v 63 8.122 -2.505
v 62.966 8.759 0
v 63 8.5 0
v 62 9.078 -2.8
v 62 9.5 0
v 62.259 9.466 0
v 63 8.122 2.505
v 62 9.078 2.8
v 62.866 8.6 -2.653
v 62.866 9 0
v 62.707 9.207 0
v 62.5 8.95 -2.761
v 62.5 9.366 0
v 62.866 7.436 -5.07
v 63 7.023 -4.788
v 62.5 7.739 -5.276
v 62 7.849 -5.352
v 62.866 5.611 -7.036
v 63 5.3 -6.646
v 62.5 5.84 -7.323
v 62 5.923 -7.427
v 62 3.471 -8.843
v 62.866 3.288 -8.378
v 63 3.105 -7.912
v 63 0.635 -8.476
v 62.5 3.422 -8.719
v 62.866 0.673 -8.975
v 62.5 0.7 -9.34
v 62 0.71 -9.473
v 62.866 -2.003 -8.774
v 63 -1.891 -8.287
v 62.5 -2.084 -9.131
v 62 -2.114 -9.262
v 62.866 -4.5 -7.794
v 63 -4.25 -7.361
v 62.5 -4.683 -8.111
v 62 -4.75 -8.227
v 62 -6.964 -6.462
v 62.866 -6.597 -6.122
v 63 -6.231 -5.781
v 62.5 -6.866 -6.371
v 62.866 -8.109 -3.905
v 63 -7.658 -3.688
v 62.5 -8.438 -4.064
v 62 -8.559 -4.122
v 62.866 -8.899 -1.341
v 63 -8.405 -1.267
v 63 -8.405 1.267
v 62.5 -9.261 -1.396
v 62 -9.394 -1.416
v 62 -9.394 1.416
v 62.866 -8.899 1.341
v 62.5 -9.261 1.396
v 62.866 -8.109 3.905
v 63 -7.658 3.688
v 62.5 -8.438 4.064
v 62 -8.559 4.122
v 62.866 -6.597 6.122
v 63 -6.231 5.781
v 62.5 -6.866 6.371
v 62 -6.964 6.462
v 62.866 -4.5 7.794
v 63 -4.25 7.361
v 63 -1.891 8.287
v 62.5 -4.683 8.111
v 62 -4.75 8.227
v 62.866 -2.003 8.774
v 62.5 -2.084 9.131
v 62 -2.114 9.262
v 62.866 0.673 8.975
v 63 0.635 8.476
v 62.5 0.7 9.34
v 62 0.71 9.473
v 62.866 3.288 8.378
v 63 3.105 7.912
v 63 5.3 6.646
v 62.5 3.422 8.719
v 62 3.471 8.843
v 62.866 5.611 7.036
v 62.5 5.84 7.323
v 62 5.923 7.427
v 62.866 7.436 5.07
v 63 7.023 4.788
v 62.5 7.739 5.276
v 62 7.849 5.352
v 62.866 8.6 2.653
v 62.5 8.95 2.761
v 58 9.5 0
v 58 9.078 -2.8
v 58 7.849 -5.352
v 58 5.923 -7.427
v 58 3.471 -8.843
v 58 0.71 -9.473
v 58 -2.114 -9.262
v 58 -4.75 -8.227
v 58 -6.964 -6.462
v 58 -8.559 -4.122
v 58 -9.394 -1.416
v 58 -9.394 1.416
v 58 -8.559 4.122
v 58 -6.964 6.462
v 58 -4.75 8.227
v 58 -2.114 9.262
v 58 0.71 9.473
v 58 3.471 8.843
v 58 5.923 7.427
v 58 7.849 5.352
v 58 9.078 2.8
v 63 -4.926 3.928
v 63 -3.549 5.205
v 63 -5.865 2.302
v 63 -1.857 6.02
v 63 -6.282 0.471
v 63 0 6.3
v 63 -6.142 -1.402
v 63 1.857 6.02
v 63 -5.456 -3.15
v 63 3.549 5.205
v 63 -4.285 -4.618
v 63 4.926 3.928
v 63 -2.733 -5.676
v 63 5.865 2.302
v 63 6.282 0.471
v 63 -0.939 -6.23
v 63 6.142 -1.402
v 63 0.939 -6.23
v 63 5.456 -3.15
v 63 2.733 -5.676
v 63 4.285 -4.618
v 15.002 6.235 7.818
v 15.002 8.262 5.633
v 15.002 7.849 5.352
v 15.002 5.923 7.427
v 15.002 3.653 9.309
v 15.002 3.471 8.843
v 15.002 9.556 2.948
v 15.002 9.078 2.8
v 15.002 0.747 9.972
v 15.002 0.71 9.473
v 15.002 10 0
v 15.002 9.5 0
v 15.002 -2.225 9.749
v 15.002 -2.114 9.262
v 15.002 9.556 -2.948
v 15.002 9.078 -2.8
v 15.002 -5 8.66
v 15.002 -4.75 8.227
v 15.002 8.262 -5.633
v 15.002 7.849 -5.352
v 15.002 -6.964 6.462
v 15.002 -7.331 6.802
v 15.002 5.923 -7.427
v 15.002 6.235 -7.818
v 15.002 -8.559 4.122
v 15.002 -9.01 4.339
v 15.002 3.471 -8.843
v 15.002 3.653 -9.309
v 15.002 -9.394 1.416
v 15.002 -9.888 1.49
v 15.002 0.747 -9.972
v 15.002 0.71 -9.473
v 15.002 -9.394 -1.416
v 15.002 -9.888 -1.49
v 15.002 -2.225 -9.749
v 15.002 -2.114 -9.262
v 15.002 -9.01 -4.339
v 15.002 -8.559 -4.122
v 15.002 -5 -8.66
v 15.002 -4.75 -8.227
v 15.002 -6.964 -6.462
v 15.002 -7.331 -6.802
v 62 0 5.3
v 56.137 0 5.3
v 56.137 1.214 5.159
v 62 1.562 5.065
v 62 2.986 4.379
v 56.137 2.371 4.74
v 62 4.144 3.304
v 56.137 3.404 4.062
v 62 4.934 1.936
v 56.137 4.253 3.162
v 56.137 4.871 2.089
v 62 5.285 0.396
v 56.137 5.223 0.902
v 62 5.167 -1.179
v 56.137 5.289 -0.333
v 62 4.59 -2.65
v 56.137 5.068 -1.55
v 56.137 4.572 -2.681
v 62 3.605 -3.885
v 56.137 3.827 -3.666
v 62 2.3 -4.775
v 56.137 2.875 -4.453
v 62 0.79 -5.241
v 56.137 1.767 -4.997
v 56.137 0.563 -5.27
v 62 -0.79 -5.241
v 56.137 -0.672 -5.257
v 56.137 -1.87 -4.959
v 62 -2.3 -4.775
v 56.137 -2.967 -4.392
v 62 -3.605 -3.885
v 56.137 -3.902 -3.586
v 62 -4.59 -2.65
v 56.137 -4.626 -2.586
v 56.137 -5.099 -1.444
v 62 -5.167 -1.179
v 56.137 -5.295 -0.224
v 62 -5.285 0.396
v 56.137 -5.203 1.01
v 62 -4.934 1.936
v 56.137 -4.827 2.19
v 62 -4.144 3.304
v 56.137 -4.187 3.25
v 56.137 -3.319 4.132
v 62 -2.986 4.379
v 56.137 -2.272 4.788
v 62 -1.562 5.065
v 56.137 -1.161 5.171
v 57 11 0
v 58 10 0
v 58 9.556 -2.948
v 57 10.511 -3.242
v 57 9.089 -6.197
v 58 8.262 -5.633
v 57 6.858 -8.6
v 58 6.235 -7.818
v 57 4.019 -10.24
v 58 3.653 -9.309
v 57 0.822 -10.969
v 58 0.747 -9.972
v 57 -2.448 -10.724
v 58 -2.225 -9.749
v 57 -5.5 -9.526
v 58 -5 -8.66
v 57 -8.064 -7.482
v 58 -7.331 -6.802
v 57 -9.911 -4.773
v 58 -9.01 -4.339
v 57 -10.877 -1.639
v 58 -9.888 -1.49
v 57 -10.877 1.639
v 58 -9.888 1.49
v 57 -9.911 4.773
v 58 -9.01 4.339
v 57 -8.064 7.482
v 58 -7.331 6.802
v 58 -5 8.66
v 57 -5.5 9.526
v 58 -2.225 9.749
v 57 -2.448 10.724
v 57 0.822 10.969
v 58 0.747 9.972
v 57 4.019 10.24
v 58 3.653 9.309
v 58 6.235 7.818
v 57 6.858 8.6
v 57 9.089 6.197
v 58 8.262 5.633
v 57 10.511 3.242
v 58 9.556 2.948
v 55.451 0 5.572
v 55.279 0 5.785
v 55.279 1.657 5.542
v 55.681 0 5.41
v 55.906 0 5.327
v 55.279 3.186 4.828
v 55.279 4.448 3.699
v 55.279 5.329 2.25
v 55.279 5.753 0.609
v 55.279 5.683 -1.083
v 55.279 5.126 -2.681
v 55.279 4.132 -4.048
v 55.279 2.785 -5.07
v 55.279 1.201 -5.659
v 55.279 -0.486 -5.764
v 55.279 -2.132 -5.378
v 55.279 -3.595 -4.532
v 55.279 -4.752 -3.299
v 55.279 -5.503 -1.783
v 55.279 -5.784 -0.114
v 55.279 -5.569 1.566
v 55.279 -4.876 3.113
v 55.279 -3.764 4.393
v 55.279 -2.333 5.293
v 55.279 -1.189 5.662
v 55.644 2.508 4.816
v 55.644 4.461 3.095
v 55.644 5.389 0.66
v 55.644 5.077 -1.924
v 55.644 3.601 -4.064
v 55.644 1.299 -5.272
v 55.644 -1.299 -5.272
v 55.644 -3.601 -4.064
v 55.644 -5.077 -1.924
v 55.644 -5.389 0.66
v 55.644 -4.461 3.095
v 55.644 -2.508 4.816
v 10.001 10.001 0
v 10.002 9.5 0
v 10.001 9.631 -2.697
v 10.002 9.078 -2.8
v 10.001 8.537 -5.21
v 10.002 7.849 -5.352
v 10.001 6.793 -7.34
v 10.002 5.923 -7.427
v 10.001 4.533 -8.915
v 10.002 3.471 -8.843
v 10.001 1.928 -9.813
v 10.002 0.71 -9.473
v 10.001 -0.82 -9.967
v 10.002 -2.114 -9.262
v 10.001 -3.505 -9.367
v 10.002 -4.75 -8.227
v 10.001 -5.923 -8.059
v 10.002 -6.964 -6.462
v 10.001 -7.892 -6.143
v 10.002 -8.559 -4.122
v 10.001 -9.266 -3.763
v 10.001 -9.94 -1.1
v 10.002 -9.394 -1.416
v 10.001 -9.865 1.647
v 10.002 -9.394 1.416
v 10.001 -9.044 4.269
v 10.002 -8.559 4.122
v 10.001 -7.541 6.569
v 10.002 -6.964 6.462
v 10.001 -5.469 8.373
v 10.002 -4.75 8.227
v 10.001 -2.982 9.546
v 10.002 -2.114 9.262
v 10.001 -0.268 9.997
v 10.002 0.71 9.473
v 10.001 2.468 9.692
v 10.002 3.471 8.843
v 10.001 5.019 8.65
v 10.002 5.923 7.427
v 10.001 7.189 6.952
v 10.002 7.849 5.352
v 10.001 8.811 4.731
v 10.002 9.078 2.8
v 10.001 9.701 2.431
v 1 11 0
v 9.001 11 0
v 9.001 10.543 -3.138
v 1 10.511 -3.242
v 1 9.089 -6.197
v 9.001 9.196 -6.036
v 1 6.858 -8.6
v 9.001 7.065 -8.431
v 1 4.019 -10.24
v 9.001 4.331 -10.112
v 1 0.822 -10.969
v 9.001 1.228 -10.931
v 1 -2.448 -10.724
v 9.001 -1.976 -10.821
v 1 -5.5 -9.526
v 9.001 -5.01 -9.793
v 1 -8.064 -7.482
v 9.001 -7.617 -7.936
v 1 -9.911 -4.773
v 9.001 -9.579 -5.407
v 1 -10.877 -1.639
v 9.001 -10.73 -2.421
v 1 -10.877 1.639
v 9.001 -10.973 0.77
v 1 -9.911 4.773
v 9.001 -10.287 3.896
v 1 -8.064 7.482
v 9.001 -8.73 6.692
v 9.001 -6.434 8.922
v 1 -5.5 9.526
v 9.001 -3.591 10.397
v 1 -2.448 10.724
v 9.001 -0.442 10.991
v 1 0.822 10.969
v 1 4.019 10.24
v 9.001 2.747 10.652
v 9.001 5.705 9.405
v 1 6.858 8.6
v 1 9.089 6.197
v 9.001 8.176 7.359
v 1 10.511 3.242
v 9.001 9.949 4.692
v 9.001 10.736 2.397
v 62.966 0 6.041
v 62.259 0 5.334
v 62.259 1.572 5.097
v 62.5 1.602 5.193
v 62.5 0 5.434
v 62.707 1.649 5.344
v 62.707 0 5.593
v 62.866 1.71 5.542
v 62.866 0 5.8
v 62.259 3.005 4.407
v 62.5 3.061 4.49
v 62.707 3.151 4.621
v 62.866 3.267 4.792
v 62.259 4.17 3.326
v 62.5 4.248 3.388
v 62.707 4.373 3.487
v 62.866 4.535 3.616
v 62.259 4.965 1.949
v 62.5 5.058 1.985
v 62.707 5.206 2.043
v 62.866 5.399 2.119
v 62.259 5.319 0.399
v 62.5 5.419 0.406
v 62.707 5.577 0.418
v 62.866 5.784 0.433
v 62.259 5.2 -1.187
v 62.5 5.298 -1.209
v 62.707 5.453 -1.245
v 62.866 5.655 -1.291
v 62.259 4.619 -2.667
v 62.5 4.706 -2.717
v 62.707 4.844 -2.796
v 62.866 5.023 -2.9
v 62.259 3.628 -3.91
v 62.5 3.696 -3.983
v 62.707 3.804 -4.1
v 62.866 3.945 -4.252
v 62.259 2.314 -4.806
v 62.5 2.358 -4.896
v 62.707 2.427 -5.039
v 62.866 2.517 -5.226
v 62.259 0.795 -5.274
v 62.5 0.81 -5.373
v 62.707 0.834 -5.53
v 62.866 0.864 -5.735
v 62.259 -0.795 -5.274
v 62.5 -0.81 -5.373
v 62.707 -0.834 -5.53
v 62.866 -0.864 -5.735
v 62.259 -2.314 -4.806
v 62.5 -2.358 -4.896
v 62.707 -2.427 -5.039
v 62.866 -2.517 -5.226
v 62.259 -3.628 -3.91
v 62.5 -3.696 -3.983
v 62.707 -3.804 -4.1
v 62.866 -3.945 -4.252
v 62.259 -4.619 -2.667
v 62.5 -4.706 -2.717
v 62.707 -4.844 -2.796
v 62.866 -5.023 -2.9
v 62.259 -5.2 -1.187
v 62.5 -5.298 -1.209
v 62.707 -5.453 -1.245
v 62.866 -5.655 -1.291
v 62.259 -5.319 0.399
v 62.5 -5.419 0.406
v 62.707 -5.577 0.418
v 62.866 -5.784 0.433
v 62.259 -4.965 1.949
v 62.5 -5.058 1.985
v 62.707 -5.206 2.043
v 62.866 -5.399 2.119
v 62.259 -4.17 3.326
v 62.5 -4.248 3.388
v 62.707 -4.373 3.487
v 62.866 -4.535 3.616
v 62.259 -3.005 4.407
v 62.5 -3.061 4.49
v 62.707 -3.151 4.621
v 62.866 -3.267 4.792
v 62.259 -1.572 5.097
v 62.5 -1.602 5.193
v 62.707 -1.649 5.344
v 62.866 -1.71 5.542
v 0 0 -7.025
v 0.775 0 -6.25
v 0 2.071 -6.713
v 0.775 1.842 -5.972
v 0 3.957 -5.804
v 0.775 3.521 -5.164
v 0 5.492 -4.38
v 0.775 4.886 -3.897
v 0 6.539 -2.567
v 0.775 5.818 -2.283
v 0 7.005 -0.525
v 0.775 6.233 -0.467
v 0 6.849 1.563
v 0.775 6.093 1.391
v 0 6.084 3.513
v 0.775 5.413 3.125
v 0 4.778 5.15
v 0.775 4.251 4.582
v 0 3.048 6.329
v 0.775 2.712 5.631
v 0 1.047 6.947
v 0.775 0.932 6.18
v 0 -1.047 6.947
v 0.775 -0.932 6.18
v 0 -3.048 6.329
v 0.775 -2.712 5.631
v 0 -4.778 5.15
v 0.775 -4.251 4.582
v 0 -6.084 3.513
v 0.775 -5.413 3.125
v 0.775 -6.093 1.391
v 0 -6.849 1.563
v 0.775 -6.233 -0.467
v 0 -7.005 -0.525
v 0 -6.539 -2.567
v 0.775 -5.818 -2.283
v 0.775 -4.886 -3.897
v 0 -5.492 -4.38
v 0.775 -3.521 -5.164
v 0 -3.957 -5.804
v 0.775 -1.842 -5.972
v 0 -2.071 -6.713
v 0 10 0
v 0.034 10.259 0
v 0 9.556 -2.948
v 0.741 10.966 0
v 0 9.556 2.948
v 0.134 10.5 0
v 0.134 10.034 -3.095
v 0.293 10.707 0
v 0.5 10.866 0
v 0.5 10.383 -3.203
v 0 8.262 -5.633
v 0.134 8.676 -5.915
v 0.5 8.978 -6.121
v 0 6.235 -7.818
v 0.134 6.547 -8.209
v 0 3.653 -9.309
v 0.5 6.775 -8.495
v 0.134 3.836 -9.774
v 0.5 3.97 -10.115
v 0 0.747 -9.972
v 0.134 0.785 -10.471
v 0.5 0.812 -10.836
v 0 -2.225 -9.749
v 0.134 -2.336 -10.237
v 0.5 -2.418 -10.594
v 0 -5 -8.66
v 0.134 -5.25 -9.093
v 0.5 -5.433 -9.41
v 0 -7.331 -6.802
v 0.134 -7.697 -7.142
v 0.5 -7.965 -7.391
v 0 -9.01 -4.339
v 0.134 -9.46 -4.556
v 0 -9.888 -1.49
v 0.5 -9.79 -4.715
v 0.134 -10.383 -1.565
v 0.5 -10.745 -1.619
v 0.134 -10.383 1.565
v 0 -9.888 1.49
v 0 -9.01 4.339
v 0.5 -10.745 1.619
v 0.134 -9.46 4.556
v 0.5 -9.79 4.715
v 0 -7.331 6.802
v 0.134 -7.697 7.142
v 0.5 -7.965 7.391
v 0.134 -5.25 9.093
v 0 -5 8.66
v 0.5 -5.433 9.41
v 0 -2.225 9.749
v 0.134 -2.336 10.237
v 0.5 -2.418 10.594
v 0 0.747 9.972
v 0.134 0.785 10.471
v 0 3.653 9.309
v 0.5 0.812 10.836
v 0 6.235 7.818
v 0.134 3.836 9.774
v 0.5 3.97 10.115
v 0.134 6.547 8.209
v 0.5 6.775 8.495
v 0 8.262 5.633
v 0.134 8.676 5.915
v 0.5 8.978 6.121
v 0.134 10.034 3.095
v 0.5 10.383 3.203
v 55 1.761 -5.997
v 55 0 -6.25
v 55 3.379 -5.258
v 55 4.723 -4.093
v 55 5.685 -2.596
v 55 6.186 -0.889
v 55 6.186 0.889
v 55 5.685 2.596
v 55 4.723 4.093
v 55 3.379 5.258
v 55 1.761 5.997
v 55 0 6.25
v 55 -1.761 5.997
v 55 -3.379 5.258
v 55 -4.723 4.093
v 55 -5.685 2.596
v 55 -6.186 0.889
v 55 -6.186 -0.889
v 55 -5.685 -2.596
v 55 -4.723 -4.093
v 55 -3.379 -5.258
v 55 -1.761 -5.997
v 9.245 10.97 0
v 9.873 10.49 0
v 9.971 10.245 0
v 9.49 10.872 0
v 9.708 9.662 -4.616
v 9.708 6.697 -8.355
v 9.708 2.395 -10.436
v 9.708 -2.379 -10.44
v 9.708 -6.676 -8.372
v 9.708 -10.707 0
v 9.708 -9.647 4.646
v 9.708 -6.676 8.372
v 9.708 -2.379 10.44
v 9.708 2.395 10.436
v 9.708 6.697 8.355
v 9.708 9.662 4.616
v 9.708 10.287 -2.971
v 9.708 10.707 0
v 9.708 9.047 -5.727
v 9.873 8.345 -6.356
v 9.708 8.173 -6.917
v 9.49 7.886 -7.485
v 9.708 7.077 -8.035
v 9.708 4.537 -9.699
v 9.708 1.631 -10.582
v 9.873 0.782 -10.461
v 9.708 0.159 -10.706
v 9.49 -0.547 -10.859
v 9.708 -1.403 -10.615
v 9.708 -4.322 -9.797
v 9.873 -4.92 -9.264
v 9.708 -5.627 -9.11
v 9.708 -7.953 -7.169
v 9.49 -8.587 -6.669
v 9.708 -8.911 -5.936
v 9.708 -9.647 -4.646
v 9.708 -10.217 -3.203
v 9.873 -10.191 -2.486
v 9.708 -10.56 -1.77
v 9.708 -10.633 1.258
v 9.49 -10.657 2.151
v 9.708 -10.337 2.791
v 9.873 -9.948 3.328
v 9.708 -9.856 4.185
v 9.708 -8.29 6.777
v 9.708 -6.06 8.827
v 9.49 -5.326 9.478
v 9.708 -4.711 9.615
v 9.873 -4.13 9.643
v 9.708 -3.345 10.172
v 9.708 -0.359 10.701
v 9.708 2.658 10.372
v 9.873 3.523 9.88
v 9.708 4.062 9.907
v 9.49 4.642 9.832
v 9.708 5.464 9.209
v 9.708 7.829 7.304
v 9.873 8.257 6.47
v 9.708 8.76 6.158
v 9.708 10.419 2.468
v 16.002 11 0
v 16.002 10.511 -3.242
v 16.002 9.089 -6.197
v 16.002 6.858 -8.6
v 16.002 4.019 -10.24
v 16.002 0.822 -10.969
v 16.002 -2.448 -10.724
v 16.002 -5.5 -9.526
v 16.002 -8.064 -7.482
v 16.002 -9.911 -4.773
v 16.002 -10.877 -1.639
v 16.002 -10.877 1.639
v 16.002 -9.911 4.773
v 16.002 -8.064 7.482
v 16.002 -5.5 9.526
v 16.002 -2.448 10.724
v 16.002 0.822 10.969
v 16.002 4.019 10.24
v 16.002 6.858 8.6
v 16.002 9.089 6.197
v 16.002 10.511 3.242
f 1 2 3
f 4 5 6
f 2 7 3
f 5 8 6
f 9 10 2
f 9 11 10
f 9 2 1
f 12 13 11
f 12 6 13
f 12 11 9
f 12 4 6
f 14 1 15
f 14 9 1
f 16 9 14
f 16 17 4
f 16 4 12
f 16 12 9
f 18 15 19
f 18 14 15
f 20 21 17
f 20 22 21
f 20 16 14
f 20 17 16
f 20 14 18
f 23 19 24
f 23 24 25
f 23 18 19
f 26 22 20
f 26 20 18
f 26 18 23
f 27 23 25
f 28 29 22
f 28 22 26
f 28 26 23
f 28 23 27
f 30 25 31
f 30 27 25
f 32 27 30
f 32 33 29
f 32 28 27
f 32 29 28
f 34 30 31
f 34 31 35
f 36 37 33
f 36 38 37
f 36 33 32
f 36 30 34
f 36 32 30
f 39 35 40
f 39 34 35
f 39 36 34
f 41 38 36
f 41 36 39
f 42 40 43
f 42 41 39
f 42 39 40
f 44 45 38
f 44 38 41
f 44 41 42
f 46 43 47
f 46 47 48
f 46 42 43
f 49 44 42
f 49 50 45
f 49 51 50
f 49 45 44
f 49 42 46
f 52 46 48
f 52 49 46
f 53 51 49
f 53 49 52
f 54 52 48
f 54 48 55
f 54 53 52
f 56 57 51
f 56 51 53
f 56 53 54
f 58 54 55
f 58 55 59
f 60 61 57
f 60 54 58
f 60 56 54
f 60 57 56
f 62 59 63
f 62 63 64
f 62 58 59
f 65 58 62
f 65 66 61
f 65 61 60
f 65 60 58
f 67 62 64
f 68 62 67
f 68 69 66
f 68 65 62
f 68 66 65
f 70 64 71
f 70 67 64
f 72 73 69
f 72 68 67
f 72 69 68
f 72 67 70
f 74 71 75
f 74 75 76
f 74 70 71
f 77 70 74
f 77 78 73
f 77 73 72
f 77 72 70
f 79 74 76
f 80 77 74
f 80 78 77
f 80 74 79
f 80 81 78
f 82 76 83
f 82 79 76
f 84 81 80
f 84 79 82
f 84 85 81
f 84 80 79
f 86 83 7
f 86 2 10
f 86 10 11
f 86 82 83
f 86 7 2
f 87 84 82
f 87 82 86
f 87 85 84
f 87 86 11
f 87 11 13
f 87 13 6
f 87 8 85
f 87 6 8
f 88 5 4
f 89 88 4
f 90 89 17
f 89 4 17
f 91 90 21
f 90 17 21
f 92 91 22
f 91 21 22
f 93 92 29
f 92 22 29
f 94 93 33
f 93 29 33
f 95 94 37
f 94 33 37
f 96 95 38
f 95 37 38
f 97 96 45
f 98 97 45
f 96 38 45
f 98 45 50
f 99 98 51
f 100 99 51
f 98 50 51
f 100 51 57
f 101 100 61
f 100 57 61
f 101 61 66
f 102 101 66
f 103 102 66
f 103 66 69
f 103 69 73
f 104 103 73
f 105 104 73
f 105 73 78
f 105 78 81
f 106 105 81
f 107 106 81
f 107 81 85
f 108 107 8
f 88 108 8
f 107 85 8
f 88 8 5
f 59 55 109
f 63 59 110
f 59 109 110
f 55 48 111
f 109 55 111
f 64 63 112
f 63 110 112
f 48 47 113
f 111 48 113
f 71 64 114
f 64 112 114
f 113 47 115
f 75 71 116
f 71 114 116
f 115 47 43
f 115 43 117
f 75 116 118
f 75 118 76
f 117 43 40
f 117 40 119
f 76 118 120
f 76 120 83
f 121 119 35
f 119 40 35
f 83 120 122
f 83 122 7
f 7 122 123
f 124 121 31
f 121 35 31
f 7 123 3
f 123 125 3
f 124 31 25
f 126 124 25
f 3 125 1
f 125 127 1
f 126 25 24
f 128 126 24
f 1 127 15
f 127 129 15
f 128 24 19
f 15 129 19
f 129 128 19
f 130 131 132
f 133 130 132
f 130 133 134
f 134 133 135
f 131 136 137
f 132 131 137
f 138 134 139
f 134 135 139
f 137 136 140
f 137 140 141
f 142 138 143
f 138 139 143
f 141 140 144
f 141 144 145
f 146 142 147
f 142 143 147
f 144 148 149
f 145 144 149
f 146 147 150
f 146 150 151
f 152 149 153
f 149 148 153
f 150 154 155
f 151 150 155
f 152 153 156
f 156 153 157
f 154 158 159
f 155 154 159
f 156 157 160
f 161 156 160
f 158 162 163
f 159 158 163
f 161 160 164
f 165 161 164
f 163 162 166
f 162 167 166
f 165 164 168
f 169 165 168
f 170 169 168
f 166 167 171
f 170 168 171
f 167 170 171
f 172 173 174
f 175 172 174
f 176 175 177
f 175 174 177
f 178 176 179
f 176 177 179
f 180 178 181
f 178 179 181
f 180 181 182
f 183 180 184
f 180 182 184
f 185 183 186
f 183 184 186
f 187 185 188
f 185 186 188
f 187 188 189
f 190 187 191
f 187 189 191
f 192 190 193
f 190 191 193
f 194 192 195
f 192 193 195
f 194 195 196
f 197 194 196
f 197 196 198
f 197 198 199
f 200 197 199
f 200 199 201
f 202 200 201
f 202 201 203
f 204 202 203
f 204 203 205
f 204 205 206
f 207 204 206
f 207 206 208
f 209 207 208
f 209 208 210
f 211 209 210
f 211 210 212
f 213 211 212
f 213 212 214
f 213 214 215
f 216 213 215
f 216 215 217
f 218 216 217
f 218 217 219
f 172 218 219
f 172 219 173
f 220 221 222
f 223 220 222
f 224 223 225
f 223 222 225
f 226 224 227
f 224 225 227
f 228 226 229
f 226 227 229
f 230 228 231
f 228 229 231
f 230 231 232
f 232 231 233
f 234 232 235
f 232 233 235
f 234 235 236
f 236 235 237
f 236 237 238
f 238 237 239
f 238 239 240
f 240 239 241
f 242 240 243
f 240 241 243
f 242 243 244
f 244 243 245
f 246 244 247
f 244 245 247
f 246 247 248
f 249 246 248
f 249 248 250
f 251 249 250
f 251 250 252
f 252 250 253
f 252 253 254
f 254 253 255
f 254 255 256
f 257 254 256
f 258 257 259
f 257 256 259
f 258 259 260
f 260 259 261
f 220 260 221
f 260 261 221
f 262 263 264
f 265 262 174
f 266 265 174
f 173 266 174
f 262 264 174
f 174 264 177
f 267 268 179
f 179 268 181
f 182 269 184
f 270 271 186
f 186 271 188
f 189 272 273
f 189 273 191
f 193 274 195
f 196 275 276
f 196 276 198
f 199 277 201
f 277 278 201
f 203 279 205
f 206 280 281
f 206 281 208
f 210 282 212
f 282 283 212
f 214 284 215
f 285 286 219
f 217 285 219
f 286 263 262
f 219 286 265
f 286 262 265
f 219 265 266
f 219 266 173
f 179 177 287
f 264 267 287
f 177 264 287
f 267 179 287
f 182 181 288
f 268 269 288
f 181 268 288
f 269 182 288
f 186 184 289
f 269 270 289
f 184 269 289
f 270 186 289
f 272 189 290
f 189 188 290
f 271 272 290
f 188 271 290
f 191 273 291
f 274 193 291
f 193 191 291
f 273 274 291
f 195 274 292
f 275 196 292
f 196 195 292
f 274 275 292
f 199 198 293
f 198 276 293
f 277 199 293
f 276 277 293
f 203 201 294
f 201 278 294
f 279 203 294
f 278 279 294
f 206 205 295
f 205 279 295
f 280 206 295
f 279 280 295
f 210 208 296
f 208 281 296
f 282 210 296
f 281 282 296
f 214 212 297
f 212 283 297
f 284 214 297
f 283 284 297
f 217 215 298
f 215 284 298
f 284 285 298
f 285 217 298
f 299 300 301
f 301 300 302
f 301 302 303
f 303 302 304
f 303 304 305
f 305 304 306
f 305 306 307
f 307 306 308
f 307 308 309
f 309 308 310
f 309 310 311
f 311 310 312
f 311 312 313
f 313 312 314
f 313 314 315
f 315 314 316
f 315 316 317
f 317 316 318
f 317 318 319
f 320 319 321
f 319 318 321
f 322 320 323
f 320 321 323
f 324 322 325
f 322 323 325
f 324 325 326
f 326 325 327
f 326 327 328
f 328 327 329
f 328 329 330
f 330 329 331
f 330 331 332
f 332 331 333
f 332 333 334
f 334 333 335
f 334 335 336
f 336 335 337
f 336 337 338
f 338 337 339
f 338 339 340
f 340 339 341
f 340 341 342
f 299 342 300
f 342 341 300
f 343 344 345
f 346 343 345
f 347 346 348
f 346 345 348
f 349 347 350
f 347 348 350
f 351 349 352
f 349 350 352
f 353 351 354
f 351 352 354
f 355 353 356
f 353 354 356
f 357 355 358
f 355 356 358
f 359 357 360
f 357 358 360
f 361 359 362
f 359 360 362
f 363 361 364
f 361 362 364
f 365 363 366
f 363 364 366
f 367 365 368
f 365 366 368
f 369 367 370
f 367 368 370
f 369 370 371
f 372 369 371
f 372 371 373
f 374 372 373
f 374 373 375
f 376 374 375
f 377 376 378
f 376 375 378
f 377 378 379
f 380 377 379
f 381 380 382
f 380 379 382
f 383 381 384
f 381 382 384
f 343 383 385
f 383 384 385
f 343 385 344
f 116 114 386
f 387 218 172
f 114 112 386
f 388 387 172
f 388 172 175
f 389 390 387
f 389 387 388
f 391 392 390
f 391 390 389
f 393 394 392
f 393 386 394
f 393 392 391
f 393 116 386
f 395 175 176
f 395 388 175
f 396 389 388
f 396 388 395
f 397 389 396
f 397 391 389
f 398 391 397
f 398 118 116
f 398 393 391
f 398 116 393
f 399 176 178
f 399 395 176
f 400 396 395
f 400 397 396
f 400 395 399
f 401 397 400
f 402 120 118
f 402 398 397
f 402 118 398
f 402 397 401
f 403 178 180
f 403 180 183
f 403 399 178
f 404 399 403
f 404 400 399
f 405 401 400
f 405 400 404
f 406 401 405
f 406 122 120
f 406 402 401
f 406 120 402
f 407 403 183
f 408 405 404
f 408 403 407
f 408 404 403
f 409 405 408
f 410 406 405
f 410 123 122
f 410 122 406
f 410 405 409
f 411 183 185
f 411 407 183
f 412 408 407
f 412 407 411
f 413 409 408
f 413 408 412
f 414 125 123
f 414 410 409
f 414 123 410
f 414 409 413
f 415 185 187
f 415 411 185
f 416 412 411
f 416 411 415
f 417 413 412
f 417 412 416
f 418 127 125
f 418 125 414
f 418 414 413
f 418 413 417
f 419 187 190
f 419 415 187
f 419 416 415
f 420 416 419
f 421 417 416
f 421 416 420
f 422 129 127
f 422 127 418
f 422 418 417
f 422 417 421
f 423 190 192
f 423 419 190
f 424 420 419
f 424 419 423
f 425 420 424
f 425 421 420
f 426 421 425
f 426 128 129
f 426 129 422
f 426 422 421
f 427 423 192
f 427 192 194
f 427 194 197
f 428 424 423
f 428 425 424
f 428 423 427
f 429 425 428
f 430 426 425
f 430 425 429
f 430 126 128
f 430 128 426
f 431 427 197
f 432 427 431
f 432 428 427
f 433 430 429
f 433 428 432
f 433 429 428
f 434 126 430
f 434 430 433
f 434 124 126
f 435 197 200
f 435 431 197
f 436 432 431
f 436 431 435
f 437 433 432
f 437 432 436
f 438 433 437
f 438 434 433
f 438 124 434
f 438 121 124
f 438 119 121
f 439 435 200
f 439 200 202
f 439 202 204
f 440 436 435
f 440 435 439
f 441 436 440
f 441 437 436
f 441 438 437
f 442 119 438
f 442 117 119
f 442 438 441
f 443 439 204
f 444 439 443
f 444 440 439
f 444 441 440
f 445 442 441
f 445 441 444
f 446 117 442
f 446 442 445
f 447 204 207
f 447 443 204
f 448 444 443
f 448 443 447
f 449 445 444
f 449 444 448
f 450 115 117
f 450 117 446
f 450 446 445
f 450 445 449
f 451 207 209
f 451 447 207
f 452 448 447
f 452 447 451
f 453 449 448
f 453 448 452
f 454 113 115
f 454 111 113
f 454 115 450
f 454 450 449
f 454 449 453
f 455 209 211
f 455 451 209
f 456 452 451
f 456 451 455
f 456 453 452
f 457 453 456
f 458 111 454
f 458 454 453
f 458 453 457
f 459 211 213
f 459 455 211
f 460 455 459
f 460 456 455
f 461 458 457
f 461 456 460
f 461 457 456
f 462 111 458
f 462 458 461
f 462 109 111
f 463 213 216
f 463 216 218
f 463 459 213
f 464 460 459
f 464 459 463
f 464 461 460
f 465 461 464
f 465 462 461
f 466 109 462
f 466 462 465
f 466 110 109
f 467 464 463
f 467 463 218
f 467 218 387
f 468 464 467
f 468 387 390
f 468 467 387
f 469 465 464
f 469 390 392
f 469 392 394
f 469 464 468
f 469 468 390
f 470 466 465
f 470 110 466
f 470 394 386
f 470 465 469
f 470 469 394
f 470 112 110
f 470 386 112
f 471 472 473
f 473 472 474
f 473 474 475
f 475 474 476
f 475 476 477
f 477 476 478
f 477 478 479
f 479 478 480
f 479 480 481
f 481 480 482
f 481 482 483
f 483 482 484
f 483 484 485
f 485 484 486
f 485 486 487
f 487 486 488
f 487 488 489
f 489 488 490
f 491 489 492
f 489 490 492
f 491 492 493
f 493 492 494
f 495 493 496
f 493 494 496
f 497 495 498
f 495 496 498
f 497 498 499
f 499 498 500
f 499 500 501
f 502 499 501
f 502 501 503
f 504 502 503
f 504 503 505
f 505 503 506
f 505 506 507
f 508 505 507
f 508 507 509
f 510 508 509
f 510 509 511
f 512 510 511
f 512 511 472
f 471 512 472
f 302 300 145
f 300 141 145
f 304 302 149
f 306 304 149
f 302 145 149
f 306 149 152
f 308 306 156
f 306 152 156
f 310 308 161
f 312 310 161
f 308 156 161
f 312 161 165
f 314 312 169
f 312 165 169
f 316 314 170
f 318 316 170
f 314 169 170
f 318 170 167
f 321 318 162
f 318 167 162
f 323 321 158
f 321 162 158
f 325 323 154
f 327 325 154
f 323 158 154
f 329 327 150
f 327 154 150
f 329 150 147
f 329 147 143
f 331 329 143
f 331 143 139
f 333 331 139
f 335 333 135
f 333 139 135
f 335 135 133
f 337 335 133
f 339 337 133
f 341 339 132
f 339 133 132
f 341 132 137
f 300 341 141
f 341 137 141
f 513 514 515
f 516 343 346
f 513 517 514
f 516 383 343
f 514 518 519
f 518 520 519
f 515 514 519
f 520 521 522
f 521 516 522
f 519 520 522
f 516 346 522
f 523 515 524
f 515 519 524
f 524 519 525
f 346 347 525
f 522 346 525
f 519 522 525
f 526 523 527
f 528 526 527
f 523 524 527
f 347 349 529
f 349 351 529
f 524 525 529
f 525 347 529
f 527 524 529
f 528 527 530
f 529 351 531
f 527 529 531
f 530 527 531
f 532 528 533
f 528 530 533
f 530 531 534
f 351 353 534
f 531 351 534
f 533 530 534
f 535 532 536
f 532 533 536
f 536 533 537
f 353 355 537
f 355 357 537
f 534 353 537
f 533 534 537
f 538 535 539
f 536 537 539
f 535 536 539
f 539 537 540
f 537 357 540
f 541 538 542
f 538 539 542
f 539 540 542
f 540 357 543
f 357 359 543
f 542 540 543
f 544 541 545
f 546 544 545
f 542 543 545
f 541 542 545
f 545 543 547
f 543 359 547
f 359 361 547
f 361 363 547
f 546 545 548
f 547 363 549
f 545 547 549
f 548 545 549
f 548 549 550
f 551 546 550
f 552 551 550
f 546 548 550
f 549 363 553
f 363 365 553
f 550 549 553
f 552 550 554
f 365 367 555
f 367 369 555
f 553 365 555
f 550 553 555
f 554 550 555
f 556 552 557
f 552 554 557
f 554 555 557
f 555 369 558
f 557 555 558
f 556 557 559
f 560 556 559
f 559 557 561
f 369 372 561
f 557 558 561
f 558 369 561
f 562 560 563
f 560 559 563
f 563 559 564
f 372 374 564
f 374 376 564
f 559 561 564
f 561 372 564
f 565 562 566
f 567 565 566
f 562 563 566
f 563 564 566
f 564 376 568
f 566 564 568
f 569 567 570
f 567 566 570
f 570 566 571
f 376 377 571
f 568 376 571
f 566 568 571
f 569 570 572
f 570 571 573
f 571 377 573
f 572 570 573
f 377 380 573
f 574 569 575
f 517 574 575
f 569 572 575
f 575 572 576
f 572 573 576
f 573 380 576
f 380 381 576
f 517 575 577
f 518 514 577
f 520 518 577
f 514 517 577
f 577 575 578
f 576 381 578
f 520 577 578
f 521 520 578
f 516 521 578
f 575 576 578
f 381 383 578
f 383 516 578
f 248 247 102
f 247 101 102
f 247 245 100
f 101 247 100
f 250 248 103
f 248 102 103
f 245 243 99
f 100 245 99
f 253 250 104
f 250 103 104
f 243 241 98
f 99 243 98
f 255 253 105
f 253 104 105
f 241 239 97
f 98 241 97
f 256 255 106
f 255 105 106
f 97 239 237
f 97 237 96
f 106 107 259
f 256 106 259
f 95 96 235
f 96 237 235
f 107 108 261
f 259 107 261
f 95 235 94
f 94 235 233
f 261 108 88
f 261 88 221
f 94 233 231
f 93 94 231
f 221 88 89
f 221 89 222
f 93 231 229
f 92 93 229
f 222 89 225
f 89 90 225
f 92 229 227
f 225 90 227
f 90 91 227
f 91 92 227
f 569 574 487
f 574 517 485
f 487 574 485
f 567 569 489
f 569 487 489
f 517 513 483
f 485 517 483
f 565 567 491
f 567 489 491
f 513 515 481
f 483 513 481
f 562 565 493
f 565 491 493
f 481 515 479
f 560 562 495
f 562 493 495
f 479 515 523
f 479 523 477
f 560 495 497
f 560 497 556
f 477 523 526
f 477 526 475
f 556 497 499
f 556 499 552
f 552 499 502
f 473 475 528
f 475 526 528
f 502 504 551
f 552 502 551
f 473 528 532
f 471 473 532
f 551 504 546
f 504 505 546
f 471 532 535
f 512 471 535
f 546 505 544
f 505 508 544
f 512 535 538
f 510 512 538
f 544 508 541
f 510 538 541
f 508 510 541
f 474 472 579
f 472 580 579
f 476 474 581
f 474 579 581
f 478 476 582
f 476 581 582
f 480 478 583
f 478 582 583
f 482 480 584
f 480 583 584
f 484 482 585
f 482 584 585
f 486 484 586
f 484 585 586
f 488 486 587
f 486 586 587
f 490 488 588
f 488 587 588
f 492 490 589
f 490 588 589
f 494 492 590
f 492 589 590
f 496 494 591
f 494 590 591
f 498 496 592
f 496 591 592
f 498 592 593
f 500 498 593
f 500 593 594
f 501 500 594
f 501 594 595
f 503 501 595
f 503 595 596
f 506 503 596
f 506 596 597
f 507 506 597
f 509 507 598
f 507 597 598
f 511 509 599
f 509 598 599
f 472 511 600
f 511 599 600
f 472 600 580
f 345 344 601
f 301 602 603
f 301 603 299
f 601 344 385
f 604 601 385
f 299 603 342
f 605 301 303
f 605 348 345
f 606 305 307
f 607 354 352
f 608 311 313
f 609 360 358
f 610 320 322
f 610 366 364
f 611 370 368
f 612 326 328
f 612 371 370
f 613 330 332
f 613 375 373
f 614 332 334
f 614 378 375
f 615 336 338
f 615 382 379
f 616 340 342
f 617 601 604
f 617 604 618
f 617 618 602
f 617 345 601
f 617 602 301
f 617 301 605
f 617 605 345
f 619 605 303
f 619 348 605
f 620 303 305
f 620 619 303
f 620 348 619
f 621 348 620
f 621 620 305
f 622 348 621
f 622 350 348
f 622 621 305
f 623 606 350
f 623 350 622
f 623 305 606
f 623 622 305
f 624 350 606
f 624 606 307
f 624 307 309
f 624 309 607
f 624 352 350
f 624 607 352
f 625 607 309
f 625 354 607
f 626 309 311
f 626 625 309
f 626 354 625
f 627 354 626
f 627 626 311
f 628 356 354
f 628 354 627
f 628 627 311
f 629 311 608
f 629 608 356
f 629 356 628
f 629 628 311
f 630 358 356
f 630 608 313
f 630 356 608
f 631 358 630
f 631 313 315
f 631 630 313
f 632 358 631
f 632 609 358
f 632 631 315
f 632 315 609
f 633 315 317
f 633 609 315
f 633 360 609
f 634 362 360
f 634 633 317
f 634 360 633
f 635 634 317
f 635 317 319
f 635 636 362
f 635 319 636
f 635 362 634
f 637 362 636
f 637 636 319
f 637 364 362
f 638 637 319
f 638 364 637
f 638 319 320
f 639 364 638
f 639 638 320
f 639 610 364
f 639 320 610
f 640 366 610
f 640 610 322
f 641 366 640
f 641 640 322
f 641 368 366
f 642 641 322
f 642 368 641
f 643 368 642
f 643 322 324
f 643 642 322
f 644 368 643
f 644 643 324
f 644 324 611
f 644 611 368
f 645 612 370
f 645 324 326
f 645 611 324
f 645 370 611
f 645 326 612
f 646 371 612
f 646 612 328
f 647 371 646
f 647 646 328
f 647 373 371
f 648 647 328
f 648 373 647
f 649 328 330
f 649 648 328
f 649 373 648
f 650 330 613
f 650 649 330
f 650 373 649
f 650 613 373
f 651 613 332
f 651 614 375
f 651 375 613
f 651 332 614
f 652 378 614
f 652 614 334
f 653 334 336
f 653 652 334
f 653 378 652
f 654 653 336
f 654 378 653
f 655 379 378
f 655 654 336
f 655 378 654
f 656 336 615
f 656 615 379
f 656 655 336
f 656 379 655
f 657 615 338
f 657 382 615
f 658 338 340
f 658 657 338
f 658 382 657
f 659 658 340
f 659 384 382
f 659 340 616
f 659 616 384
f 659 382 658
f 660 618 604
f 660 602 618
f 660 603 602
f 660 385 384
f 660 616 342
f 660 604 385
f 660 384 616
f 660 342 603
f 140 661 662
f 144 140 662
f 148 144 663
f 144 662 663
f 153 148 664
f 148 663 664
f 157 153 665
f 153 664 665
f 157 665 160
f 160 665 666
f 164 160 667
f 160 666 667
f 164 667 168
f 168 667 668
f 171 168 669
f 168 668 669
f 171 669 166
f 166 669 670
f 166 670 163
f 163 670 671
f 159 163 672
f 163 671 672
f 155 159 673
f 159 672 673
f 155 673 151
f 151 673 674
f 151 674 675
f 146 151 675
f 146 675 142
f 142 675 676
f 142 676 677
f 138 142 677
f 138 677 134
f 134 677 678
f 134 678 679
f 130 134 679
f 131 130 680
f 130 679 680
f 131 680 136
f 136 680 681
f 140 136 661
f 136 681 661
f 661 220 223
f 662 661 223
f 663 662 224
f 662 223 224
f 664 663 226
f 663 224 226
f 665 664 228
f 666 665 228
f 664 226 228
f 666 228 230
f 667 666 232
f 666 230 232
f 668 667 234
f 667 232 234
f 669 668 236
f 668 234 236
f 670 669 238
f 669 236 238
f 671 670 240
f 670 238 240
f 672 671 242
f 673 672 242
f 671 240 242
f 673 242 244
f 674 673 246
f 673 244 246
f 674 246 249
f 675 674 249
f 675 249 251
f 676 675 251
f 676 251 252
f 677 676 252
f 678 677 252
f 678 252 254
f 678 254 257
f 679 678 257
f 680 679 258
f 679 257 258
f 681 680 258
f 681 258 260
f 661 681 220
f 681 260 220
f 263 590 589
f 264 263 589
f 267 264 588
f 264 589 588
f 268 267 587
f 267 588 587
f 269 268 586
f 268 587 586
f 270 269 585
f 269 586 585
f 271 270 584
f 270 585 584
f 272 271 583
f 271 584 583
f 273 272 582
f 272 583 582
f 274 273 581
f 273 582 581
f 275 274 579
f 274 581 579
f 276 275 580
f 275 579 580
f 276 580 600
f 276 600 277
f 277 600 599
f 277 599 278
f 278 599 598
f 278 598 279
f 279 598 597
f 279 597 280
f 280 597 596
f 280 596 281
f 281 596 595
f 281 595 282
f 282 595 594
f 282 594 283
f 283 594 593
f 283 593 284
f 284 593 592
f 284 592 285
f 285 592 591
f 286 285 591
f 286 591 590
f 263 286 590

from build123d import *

# Parameters (mm, degrees)
FURO_ROSCADO_DE_M14X1_51_D           = 12.5
FURO_ROSCADO_DE_M14X1_51_DEPTH       = 55
FURO_ROSCADO_DE_M14X1_51_CSINK_D     = 14.05
FURO_ROSCADO_DE_M14X1_51_CSINK_ANGLE = 90
FURO_ROSCADO_DE_M14X1_51_TIP         = 3.755378869
FURO1_D                              = 10.6
FURO1_DEPTH                          = 8
FILETE1_R                            = 1
CHANFRO1_SIZE                        = 1


with BuildPart() as part:
    # Esboço1 → Revolução1 (revolve)
    with BuildSketch(Plane.XY):
        Polygon((0, 0), (0, 11), (10, 11), (10.001583267, 9.5), (15.001583267, 9.5), (15.001583267, 11), (58, 11), (58, 9.5), (63, 9.5), (63, 0), align=None)
    revolve(axis=Axis((63, 0, 0), (-1, 0, 0)))

    # Furo roscado de M14x1.51
    with Locations(Plane.ZY):
        with Locations((0, 0)):
            CounterSinkHole(FURO_ROSCADO_DE_M14X1_51_D / 2, FURO_ROSCADO_DE_M14X1_51_CSINK_D / 2, depth=FURO_ROSCADO_DE_M14X1_51_DEPTH, counter_sink_angle=FURO_ROSCADO_DE_M14X1_51_CSINK_ANGLE)
            with Locations((0, 0, -(FURO_ROSCADO_DE_M14X1_51_DEPTH + FURO_ROSCADO_DE_M14X1_51_TIP / 2))):  # 118° drill point
                Cone(0, FURO_ROSCADO_DE_M14X1_51_D / 2, FURO_ROSCADO_DE_M14X1_51_TIP, mode=Mode.SUBTRACT)

    # Furo1
    with Locations(Plane(origin=(63, 0, 0), x_dir=(0, 0, -1), z_dir=(1, 0, 0))):
        with Locations((0, 0)):
            Hole(FURO1_D / 2, depth=FURO1_DEPTH)

    # Filete1
    filete1_edges = [part.edges().sort_by_distance(p)[0] for p in [
        (10, -11, 0),
        (0, -11, 0),
        (55.570817588, 0, -5.3),
        (63, 0, -5.3),
        (63, -9.5, 0),
    ]]
    fillet(filete1_edges, radius=FILETE1_R)

    # Chanfro1
    chanfro1_edges = [part.edges().sort_by_distance(p)[0] for p in [
        (58, -11, 0),
        (15.001583267, -11, 0),
    ]]
    chamfer(chanfro1_edges, length=CHANFRO1_SIZE)


solid = part.part
